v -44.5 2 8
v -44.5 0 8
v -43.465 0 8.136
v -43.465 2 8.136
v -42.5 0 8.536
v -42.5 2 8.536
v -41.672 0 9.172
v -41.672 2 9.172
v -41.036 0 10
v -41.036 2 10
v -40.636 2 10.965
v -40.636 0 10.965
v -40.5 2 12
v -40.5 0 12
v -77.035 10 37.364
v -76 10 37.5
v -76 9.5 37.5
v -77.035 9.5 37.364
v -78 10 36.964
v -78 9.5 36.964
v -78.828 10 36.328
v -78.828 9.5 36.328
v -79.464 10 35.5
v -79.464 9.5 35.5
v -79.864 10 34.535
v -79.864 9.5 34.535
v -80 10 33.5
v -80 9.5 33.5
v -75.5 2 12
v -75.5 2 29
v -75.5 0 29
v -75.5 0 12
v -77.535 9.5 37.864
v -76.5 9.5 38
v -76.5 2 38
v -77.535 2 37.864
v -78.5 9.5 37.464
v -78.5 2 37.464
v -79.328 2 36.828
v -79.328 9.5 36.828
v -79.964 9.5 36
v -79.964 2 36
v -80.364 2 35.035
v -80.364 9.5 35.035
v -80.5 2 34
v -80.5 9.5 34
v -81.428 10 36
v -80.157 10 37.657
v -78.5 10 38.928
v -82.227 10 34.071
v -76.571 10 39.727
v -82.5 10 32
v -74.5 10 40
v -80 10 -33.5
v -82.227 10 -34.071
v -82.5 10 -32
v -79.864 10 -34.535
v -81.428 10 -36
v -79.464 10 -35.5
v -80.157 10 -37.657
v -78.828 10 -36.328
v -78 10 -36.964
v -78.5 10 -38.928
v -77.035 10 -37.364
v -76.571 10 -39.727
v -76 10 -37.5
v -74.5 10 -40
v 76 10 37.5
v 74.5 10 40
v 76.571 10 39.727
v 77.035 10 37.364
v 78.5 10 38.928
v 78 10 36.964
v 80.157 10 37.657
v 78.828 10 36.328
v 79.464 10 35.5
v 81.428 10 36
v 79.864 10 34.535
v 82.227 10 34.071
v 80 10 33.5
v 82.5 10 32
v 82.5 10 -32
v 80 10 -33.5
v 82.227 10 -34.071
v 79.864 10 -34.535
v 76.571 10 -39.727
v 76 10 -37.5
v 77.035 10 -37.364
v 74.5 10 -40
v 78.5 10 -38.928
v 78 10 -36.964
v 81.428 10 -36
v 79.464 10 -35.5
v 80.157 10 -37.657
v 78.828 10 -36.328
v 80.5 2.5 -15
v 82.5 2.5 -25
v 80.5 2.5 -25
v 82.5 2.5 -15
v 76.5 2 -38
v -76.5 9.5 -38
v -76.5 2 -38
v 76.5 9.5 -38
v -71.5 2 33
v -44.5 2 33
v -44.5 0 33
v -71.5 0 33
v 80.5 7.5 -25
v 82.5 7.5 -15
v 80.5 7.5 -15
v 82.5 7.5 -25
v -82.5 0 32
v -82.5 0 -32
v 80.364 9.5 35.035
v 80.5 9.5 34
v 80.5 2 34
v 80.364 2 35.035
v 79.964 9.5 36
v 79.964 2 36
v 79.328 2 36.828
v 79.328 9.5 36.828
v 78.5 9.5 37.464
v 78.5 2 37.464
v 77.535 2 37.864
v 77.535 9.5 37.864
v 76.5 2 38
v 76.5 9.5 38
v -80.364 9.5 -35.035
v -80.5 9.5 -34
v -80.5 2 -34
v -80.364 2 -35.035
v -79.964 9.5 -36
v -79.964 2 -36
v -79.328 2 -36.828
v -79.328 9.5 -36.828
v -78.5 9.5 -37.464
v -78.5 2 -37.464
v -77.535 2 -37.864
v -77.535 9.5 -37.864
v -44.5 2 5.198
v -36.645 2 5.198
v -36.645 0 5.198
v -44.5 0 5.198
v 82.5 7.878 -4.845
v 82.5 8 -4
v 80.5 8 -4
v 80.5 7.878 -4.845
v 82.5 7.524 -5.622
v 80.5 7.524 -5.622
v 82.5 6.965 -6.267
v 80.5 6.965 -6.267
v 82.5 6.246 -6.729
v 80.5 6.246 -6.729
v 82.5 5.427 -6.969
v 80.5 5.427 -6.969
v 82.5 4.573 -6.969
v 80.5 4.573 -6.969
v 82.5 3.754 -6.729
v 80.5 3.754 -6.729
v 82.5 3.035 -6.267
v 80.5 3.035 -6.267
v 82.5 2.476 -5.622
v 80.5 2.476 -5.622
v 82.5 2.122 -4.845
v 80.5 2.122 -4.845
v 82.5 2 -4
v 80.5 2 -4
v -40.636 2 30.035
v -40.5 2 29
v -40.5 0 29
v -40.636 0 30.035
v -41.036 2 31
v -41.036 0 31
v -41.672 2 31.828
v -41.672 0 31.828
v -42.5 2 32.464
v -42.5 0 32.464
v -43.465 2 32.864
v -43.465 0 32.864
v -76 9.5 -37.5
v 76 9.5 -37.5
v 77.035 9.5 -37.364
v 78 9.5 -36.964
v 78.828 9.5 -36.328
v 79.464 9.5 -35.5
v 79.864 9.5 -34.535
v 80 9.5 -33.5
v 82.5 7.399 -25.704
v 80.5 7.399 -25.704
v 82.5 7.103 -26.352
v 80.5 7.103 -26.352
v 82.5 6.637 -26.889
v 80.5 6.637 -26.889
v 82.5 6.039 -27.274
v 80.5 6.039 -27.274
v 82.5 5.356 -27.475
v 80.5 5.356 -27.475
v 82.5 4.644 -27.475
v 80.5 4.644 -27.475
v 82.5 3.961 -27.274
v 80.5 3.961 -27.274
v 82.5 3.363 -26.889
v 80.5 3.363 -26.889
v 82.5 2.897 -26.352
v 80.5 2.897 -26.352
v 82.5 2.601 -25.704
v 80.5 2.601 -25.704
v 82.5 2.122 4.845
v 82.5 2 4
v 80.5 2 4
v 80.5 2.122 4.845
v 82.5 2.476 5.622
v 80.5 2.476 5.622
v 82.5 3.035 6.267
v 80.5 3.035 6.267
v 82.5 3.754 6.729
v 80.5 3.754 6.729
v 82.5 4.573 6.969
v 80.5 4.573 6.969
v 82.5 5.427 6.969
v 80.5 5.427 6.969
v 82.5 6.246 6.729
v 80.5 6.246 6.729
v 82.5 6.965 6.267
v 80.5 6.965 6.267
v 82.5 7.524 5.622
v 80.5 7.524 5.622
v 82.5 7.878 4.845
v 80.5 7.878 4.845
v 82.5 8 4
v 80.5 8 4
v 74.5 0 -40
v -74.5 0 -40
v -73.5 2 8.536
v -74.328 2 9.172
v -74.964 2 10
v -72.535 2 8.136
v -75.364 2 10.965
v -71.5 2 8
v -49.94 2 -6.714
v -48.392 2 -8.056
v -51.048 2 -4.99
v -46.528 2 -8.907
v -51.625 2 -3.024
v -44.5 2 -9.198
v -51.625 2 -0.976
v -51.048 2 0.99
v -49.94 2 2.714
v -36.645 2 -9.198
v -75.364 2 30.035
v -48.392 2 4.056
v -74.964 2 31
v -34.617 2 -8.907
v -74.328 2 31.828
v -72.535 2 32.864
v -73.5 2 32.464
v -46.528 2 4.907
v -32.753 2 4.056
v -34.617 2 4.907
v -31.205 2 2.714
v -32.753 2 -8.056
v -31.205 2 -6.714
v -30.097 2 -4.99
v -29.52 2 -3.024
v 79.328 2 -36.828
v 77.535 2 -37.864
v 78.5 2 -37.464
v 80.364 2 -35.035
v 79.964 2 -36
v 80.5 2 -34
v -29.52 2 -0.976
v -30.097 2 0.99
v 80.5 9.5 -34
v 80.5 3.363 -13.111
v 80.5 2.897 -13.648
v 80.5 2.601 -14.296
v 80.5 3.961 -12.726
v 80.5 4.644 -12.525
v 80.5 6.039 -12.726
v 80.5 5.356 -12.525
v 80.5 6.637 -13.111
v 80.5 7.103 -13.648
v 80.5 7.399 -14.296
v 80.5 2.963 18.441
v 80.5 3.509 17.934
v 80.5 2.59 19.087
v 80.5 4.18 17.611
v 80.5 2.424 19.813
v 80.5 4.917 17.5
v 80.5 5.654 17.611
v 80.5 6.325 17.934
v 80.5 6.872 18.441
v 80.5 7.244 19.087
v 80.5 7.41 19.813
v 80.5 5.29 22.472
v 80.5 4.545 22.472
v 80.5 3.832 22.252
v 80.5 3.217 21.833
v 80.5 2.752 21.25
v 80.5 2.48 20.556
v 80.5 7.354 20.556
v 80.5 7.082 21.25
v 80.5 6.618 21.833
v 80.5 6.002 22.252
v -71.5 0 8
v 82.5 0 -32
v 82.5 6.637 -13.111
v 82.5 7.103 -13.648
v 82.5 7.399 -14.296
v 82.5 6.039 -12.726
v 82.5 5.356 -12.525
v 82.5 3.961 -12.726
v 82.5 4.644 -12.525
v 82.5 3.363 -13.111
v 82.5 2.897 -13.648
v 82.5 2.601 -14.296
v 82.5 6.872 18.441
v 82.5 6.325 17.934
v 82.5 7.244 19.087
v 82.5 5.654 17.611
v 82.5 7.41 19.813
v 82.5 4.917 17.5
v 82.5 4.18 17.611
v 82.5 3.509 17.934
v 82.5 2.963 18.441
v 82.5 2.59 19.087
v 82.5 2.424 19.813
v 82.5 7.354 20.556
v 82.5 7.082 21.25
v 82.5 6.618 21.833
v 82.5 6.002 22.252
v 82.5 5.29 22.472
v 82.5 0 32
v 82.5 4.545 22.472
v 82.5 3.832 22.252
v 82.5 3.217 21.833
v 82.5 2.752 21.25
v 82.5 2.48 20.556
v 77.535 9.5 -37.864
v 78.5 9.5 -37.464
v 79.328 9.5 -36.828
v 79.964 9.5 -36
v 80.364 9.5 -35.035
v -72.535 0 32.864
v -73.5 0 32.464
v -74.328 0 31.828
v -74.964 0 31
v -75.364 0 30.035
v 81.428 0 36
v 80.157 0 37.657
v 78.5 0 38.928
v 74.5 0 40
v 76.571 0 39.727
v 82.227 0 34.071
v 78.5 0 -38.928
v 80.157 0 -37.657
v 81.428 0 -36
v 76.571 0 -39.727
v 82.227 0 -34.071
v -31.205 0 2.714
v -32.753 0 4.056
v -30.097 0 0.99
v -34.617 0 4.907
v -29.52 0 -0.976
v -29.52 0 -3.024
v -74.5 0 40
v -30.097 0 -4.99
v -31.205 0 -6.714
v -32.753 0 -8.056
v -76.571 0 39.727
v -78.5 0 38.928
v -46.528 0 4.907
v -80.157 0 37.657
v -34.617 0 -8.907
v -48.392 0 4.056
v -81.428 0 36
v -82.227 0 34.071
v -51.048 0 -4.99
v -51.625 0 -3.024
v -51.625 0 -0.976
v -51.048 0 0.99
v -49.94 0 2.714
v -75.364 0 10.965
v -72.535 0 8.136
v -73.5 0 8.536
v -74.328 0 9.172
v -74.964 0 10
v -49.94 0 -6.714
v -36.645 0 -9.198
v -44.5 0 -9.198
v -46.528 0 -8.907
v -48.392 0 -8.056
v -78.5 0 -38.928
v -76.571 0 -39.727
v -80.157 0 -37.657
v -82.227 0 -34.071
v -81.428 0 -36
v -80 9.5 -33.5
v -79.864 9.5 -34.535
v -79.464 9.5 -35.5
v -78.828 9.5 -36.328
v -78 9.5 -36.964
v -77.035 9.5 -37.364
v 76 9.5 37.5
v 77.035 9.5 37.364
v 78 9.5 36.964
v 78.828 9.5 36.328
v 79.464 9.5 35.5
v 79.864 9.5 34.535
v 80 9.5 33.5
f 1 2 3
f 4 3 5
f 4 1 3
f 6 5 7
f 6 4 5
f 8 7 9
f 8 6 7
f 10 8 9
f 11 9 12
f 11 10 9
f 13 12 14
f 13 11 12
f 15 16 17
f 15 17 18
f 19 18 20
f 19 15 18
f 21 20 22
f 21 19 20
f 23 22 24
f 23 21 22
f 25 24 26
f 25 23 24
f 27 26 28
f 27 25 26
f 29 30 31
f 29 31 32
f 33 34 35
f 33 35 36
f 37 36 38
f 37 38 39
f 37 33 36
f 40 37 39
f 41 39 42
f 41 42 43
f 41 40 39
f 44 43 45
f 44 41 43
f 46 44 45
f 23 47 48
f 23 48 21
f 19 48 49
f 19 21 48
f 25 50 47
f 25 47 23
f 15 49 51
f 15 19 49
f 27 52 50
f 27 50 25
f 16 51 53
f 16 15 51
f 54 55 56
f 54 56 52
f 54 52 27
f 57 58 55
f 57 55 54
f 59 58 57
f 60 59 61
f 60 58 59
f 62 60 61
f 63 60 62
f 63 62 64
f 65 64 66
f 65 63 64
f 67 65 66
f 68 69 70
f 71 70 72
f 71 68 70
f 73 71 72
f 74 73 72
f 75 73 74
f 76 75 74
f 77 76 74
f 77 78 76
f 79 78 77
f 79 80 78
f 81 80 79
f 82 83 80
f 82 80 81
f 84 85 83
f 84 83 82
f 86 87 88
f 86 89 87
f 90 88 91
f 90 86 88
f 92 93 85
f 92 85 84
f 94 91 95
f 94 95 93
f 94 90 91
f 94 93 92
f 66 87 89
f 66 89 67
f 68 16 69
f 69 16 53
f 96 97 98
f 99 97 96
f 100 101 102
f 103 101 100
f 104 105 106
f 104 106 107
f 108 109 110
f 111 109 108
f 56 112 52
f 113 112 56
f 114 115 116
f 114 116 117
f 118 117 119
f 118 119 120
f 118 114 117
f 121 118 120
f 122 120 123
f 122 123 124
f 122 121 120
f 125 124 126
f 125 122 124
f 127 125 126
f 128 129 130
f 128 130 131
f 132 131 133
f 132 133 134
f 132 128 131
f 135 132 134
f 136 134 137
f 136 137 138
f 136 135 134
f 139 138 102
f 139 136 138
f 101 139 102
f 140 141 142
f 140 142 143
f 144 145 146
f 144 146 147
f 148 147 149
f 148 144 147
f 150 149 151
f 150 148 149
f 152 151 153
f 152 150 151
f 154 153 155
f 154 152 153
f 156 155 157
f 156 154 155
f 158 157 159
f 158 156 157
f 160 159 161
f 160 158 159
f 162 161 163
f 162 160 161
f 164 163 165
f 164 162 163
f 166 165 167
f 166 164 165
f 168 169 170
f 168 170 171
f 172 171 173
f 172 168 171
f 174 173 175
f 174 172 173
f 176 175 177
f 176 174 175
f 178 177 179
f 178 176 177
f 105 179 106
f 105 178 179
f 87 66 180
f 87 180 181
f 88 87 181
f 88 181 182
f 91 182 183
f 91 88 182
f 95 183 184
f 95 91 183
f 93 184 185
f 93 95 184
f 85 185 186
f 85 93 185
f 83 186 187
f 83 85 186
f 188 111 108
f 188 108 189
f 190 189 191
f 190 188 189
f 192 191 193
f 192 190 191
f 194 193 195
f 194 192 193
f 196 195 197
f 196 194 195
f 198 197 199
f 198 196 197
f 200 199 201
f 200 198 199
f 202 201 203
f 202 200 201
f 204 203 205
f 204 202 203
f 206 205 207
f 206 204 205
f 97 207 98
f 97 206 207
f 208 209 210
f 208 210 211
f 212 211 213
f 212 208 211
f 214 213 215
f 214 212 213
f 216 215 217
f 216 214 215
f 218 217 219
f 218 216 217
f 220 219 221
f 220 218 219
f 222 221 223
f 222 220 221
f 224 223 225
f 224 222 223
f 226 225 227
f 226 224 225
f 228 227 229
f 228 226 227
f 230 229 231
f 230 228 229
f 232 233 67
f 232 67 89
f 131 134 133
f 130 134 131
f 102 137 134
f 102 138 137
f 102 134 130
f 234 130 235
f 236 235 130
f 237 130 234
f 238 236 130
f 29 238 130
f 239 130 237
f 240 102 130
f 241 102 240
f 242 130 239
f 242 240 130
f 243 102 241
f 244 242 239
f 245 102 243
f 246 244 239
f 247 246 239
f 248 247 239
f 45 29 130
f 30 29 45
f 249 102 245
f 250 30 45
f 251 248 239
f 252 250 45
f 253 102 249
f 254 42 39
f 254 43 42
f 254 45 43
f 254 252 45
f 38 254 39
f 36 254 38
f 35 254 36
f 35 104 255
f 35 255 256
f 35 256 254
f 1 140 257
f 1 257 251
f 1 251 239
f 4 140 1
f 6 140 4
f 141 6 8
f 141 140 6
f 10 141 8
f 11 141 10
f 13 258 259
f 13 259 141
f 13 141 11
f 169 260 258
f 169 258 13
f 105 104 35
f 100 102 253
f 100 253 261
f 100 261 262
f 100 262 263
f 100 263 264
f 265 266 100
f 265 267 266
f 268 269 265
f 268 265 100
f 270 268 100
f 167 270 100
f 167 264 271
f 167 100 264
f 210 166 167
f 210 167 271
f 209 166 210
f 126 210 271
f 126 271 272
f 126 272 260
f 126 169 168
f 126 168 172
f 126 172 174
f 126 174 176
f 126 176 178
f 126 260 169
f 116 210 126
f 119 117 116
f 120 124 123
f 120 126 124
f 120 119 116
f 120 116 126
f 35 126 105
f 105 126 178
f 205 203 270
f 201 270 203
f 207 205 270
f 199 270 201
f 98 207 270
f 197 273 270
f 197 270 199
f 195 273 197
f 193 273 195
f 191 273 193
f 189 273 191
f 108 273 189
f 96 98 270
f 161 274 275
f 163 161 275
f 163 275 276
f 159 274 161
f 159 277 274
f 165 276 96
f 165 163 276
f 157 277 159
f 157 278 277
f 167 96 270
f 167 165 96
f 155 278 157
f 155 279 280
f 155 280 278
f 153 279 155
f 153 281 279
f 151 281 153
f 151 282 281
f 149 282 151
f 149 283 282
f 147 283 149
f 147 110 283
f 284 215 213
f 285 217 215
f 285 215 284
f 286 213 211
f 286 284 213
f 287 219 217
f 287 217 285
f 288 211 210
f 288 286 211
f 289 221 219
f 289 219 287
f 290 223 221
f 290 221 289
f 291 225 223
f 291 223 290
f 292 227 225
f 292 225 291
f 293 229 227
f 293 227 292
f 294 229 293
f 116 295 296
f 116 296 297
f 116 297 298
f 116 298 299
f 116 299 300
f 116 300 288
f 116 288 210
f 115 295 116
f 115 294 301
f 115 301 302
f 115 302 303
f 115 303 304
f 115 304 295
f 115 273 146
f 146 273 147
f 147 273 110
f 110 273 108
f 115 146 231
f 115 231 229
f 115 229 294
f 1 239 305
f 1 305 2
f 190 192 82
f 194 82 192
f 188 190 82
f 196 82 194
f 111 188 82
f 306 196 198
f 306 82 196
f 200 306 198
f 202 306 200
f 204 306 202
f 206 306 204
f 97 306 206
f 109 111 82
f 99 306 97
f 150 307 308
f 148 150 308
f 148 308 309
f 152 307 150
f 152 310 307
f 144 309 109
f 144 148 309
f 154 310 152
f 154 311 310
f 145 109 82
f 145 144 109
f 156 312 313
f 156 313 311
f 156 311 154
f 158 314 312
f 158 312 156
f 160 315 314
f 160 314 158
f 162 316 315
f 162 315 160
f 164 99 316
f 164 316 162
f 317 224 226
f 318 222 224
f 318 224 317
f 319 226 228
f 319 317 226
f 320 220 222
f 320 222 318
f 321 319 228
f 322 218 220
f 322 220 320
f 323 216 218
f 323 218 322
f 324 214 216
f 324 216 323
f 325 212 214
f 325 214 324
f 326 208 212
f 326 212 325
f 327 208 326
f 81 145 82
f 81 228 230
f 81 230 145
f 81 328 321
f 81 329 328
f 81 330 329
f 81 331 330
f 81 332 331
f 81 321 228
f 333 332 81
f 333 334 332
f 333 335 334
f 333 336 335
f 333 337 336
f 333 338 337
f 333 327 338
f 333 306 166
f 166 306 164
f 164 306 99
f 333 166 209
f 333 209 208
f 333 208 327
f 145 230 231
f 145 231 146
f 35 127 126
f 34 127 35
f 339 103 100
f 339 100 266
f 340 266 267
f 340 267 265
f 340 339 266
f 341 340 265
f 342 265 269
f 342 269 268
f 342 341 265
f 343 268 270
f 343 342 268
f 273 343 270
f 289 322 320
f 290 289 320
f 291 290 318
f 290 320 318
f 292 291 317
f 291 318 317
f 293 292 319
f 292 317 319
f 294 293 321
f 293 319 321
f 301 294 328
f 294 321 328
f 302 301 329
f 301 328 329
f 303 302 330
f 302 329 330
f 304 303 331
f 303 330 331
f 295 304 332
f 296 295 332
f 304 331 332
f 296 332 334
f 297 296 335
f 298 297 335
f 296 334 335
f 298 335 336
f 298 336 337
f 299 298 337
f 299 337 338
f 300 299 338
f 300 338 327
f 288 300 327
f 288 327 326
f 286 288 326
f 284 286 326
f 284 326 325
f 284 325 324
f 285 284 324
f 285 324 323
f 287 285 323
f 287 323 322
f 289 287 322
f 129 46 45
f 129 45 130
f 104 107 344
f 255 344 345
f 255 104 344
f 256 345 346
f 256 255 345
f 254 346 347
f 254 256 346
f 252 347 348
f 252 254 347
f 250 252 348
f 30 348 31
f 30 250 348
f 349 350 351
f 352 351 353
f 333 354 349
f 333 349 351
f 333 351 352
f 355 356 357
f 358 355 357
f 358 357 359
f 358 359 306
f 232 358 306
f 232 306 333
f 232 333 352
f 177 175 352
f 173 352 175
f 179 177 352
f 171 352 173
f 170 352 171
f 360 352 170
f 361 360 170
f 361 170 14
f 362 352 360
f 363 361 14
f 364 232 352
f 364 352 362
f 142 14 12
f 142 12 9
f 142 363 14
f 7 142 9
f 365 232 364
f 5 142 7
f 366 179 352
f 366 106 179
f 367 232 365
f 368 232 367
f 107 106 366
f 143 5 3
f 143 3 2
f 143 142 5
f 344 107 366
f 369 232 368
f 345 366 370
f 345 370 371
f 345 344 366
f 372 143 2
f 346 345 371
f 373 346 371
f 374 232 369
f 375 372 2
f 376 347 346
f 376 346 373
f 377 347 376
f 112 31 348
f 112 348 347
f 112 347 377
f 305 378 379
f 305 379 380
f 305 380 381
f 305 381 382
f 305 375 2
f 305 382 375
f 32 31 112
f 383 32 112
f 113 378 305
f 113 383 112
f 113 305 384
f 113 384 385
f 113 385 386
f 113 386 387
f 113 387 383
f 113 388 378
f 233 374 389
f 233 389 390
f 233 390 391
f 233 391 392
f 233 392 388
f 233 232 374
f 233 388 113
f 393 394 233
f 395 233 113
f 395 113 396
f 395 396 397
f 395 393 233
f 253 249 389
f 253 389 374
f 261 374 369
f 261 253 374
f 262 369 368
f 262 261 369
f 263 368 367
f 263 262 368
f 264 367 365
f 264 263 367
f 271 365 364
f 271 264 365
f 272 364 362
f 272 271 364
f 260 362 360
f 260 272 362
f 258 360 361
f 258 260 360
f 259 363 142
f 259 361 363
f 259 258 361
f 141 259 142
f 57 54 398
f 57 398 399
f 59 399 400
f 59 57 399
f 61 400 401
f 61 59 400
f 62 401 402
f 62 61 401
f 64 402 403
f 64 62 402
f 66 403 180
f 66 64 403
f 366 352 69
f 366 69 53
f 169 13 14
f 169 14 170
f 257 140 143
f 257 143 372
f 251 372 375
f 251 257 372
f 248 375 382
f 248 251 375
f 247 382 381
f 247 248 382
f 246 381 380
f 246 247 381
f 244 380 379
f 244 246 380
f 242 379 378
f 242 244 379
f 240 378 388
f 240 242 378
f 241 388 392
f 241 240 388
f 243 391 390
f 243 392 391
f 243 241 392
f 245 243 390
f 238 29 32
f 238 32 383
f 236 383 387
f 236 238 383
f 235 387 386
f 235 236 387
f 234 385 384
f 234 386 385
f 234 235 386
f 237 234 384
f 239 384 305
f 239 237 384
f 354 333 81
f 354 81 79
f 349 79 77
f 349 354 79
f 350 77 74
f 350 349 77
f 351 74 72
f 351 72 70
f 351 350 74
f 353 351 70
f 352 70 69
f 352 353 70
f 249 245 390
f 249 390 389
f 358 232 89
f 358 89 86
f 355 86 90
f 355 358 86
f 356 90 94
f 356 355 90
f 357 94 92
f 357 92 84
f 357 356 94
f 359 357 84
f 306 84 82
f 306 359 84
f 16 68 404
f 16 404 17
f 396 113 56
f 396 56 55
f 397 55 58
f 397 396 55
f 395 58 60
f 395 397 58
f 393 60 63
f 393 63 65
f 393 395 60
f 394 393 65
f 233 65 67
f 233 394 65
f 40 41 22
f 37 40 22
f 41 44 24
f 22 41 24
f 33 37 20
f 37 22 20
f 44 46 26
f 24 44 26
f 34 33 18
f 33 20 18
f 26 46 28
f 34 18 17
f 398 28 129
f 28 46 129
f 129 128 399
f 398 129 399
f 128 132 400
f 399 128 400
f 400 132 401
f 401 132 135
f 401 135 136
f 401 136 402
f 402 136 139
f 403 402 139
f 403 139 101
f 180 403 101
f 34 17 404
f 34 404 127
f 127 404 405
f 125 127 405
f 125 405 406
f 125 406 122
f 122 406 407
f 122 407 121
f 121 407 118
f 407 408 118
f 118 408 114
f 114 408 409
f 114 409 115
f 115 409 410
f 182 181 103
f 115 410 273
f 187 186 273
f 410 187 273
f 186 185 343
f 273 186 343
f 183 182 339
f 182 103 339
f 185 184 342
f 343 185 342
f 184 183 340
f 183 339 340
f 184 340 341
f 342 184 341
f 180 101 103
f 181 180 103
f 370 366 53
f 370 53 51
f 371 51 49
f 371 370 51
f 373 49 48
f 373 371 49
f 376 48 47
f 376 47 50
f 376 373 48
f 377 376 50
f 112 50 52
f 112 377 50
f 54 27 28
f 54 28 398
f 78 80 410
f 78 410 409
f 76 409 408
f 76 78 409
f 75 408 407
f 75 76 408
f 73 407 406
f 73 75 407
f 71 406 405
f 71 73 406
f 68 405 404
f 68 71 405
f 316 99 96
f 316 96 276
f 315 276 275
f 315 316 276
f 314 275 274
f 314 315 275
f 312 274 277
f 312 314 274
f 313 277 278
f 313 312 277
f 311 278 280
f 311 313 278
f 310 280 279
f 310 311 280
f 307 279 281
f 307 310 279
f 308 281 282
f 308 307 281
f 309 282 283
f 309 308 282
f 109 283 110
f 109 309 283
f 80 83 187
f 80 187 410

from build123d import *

# Parameters (mm, degrees)
BOSS_EXTRUDE1_DEPTH = 10
CUT_EXTRUDE1_DEPTH  = 8
CUT_EXTRUDE2_DEPTH  = 8
SKETCH4_R           = 2.5
CUT_EXTRUDE3_DEPTH  = 8
BOSS_EXTRUDE2_DEPTH = 0.5


with BuildPart() as part:
    # Sketch1 → Boss-Extrude1 (new body)
    with BuildSketch(Plane(origin=(0, 0, 0), x_dir=(1, 0, 0), z_dir=(0, 1, 0))):
        with BuildLine():
            Line((-74.5, 40), (74.5, 40))
            ThreePointArc((74.5, 40), (80.156854249, 37.656854249), (82.5, 32))
            Line((82.5, 32), (82.5, -32))
            ThreePointArc((82.5, -32), (80.156854249, -37.656854249), (74.5, -40))
            Line((74.5, -40), (-74.5, -40))
            ThreePointArc((-74.5, -40), (-80.156854249, -37.656854249), (-82.5, -32))
            Line((-82.5, -32), (-82.5, 32))
            ThreePointArc((-82.5, 32), (-80.156854249, 37.656854249), (-74.5, 40))
        make_face()
    extrude(amount=BOSS_EXTRUDE1_DEPTH)

    # Sketch2 → Cut-Extrude1 (cut)
    with BuildSketch(Plane(origin=(0, 10, 0), x_dir=(1, 0, 0), z_dir=(0, 1, 0))):
        with BuildLine():
            Line((-76.5, 38), (76.5, 38))
            ThreePointArc((76.5, 38), (79.328427125, 36.828427125), (80.5, 34))
            Line((80.5, 34), (80.5, -34))
            ThreePointArc((80.5, -34), (79.328427125, -36.828427125), (76.5, -38))
            Line((76.5, -38), (-76.5, -38))
            ThreePointArc((-76.5, -38), (-79.328427125, -36.828427125), (-80.5, -34))
            Line((-80.5, -34), (-80.5, 34))
            ThreePointArc((-80.5, 34), (-79.328427125, 36.828427125), (-76.5, 38))
        make_face()
    extrude(amount=-CUT_EXTRUDE1_DEPTH, mode=Mode.SUBTRACT)

    # Sketch3 → Cut-Extrude2 (cut)
    with BuildSketch(Plane(origin=(0, 2, 0), x_dir=(1, 0, 0), z_dir=(0, 1, 0))):
        with BuildLine():
            Line((-71.5, -8), (-44.5, -8))
            ThreePointArc((-44.5, -8), (-41.671572875, -9.171572875), (-40.5, -12))
            Line((-40.5, -12), (-40.5, -29))
            ThreePointArc((-40.5, -29), (-41.671572875, -31.828427125), (-44.5, -33))
            Line((-44.5, -33), (-71.5, -33))
            ThreePointArc((-71.5, -33), (-74.328427125, -31.828427125), (-75.5, -29))
            Line((-75.5, -29), (-75.5, -12))
            ThreePointArc((-75.5, -12), (-74.328427125, -9.171572875), (-71.5, -8))
        make_face()
        with BuildLine():
            Line((-44.5, 9.198469839), (-36.645114423, 9.198469839))
            ThreePointArc((-36.645114423, 9.198469839), (-29.446644584, 2), (-36.645114423, -5.198469839))
            Line((-36.645114423, -5.198469839), (-44.5, -5.198469839))
            ThreePointArc((-44.5, -5.198469839), (-51.698469839, 2), (-44.5, 9.198469839))
        make_face()
    extrude(amount=-CUT_EXTRUDE2_DEPTH, mode=Mode.SUBTRACT)

    # Sketch4 → Cut-Extrude3 (cut)
    with BuildSketch(Plane(origin=(82.5, 0, 0), x_dir=(0, 0, -1), z_dir=(1, 0, 0))):
        with Locations((-20, 4.917165975)):
            Circle(SKETCH4_R)
        with BuildLine():
            Line((-4, 8), (4, 8))
            ThreePointArc((4, 8), (7, 5), (4, 2))
            Line((4, 2), (-4, 2))
            ThreePointArc((-4, 2), (-7, 5), (-4, 8))
        make_face()
        with BuildLine():
            Line((15, 7.5), (25, 7.5))
            ThreePointArc((25, 7.5), (27.5, 5), (25, 2.5))
            Line((25, 2.5), (15, 2.5))
            ThreePointArc((15, 2.5), (12.5, 5), (15, 7.5))
        make_face()
    extrude(amount=-CUT_EXTRUDE3_DEPTH, mode=Mode.SUBTRACT)

    # Sketch6 → Boss-Extrude2 (add)
    with BuildSketch(Plane(origin=(0, 10, 0), x_dir=(1, 0, 0), z_dir=(0, 1, 0))):
        with BuildLine():
            Line((80.5, -34), (80.5, 34))
            ThreePointArc((80.5, 34), (79.328427125, 36.828427125), (76.5, 38))
            Line((76.5, 38), (-76.5, 38))
            ThreePointArc((-76.5, 38), (-79.328427125, 36.828427125), (-80.5, 34))
            Line((-80.5, 34), (-80.5, -34))
            ThreePointArc((-80.5, -34), (-79.328427125, -36.828427125), (-76.5, -38))
            Line((-76.5, -38), (76.5, -38))
            ThreePointArc((76.5, -38), (79.328427125, -36.828427125), (80.5, -34))
        make_face()
        with BuildLine():
            Line((-76, 37.5), (76, 37.5))
            ThreePointArc((76, 37.5), (78.828427125, 36.328427125), (80, 33.5))
            Line((80, 33.5), (80, -33.5))
            ThreePointArc((80, -33.5), (78.828427125, -36.328427125), (76, -37.5))
            Line((76, -37.5), (-76, -37.5))
            ThreePointArc((-76, -37.5), (-78.828427125, -36.328427125), (-80, -33.5))
            Line((-80, -33.5), (-80, 33.5))
            ThreePointArc((-80, 33.5), (-78.828427125, 36.328427125), (-76, 37.5))
        make_face(mode=Mode.SUBTRACT)
    extrude(amount=-BOSS_EXTRUDE2_DEPTH)


solid = part.part
